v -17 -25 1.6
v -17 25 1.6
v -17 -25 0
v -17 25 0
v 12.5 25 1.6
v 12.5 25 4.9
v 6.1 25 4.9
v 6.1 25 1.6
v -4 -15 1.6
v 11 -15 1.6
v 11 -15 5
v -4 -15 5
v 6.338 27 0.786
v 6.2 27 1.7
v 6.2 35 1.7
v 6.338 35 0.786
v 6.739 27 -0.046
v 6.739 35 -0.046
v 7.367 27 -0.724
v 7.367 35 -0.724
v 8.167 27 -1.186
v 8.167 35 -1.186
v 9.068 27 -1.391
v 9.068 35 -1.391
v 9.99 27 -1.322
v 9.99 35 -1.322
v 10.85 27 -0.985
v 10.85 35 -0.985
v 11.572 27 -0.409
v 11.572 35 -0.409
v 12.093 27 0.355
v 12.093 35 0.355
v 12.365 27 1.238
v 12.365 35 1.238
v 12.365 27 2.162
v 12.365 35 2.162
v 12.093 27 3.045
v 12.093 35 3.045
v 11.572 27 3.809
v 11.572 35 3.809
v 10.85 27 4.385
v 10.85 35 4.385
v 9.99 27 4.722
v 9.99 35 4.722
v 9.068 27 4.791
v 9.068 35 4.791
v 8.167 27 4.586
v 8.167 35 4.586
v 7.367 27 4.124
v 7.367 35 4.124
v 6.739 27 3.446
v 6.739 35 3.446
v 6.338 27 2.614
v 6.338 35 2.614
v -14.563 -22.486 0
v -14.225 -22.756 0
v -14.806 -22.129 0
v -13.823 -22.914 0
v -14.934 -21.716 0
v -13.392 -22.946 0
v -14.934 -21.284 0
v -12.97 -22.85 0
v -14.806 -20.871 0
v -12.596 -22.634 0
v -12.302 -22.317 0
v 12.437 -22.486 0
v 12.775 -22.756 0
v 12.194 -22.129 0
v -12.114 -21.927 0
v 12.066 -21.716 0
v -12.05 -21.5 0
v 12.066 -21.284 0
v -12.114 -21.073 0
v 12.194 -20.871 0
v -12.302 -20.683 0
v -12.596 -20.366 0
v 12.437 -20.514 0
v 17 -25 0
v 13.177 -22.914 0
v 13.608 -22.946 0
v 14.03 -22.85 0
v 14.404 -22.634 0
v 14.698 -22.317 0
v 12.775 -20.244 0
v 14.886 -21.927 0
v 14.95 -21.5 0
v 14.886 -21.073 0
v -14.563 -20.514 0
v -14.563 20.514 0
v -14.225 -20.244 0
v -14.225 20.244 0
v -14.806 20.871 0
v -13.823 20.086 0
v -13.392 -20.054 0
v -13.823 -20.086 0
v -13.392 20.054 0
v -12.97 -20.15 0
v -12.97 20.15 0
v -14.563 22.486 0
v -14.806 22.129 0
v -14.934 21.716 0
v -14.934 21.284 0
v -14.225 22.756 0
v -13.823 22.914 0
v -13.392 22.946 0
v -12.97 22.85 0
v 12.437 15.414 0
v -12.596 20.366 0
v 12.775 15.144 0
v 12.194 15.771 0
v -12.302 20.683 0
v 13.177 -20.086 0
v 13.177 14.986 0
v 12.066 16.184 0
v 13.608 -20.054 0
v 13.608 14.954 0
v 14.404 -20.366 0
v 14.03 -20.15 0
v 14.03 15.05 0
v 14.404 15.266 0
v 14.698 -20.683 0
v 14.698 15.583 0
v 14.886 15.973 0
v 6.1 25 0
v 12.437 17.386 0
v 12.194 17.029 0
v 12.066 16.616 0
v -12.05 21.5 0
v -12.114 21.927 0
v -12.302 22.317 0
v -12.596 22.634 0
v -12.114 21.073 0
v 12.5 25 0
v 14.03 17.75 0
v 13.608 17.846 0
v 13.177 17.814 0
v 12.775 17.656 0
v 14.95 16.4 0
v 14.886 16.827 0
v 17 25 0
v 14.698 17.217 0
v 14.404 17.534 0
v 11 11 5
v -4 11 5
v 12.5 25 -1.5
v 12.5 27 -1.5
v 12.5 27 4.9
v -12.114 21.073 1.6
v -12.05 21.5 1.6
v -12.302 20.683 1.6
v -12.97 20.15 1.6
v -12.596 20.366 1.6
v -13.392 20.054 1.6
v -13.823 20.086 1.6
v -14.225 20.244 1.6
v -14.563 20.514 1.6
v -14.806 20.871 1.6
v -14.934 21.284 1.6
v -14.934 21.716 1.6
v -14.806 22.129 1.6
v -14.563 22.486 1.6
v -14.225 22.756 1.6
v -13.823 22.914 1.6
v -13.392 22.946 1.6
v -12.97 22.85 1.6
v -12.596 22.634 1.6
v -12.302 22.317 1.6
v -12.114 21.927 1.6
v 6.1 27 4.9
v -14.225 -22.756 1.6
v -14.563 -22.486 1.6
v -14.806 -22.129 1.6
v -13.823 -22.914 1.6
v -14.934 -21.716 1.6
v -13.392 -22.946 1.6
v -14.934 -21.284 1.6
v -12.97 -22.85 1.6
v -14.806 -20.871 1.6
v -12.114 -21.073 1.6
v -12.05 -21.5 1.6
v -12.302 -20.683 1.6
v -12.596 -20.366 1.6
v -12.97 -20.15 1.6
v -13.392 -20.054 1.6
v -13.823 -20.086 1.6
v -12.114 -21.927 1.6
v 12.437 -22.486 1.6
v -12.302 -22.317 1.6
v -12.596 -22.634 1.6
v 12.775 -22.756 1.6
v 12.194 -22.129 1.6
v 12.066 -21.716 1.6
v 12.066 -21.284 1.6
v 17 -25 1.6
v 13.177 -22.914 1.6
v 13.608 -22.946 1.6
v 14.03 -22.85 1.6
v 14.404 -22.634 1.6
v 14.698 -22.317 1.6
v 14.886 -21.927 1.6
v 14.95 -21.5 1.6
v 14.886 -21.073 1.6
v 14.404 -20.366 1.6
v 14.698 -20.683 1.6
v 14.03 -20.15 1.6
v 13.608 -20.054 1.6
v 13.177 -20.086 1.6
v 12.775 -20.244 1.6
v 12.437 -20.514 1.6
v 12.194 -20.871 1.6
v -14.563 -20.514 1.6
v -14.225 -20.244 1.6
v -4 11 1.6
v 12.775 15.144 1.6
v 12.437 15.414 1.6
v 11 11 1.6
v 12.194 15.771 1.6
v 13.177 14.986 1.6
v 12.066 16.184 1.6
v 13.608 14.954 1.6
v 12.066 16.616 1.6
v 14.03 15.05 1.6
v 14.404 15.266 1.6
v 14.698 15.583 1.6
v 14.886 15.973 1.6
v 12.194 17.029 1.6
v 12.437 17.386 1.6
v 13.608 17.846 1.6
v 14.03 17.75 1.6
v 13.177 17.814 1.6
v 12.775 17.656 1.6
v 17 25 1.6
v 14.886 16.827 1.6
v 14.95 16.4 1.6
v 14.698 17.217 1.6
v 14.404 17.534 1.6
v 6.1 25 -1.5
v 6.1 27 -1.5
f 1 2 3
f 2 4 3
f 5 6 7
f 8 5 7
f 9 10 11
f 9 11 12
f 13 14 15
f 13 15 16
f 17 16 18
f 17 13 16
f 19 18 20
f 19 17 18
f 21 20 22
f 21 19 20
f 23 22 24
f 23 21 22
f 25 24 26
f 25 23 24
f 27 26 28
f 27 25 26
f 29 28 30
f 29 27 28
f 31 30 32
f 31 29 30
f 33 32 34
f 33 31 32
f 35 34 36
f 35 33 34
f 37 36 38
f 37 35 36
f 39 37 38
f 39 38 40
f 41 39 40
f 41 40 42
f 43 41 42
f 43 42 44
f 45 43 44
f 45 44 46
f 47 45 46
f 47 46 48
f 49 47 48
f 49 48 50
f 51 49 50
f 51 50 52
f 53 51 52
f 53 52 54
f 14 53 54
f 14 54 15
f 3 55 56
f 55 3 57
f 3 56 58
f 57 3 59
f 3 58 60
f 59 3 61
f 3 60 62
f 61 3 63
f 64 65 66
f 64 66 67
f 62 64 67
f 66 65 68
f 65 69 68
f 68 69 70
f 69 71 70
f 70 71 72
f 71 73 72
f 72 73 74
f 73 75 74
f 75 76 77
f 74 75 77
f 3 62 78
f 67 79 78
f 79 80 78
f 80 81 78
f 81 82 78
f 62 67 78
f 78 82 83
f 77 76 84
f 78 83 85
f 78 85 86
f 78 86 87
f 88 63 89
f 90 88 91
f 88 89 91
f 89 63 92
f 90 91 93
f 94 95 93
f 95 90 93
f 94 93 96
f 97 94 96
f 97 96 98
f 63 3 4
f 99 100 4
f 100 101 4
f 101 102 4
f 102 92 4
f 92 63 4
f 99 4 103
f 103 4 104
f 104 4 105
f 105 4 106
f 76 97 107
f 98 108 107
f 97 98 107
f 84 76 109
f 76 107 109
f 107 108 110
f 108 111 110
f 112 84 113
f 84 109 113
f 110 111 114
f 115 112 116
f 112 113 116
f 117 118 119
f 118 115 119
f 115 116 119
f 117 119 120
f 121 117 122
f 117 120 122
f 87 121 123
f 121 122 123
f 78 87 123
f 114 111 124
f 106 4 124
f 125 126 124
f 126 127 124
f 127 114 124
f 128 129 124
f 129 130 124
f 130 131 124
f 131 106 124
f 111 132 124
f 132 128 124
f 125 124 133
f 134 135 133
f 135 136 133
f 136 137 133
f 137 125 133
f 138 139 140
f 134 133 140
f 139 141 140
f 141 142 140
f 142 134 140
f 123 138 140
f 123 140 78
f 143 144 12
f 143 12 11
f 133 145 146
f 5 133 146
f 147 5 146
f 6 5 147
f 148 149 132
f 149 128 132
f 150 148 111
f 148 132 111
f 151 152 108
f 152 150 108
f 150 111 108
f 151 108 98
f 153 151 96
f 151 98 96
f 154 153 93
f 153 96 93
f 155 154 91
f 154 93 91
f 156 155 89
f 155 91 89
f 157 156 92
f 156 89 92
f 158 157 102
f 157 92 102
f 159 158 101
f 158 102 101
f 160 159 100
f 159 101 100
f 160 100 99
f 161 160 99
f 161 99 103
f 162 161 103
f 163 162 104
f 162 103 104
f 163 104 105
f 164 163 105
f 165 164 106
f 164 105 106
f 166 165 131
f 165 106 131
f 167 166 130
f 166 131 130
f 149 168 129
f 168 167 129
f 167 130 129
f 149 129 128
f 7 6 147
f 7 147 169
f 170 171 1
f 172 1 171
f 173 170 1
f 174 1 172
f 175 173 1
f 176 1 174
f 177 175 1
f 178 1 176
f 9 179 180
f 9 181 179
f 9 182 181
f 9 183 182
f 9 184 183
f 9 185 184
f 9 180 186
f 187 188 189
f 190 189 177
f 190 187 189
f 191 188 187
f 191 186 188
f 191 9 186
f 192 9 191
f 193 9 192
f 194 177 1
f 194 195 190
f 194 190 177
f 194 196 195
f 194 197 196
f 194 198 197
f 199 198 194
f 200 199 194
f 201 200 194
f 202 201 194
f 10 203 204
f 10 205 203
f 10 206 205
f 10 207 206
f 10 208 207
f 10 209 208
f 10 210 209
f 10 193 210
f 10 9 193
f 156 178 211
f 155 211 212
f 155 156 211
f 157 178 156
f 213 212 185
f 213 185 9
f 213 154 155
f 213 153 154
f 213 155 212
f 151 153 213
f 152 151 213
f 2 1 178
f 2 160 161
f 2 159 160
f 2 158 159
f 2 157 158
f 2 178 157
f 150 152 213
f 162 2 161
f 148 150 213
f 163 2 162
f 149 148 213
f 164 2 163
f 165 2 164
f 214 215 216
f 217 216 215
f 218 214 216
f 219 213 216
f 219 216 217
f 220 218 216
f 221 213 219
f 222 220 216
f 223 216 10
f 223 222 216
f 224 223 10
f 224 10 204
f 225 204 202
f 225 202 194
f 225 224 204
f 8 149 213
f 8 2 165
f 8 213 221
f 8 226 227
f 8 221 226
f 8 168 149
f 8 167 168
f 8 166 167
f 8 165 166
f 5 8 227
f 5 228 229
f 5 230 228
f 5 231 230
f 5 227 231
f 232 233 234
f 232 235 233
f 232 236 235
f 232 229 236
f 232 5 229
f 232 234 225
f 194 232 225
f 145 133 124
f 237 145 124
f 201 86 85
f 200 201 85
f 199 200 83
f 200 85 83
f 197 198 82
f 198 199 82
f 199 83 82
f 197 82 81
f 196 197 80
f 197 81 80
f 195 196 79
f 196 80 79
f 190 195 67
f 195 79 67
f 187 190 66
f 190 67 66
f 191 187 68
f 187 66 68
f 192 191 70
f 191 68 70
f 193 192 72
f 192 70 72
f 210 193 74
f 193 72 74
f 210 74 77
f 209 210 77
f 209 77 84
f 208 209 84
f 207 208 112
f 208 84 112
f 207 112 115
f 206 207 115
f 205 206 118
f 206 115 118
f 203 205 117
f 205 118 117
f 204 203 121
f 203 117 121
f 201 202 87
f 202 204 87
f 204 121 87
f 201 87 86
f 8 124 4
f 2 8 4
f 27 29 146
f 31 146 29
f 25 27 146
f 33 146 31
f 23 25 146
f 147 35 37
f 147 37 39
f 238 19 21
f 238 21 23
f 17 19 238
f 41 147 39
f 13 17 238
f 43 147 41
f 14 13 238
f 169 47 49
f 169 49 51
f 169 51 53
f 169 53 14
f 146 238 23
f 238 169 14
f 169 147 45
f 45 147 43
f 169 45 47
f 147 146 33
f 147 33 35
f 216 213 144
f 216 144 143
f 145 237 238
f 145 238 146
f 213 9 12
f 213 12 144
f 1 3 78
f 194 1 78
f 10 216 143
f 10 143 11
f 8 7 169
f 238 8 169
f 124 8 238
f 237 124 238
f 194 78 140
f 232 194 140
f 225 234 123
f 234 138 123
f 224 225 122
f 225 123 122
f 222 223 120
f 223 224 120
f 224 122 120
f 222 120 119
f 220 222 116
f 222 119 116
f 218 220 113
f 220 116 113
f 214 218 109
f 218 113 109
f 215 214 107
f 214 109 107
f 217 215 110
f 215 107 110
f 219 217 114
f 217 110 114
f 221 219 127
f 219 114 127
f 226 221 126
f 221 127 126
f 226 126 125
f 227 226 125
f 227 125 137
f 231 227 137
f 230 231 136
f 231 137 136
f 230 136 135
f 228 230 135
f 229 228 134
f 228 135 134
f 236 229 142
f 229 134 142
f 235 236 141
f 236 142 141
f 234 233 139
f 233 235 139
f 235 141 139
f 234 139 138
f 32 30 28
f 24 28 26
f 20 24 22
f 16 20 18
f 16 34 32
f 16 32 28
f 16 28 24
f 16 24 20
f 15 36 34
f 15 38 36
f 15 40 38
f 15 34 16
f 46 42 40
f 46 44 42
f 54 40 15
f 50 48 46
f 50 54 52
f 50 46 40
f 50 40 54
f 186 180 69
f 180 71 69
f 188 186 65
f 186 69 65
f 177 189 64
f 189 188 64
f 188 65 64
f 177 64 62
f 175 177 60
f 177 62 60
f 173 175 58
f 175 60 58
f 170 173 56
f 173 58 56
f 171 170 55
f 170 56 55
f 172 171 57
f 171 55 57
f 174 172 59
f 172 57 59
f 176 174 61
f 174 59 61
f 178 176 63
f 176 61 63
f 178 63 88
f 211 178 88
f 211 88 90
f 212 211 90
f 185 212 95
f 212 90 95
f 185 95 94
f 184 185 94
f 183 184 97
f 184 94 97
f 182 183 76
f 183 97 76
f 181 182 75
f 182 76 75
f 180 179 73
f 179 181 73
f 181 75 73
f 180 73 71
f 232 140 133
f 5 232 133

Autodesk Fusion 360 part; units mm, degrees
sketch "Sketch1" plane through (0, 0, 0) normal (0, 0, 1) x (1, 0, 0)
  line L0 (17, 25) -> (-17, 25)
  line L1 (-17, 25) -> (-17, -25)
  line L2 (-17, -25) -> (17, -25)
  line L3 (17, -25) -> (17, 25)
  line L4 (17, 25) -> (-17, -25) construction
  line L5 (-17, 25) -> (17, -25) construction
  circle A0 centre (-13.5, 21.5) radius 1.45
  line L6 (-20, 0) -> (19, 0) construction
  circle A1 centre (-13.5, -21.5) radius 1.45
  line L7 (0, -29) -> (0, 26) construction
  circle A2 centre (13.5, -21.5) radius 1.45
  circle A3 centre (13.5, 16.4) radius 1.45
  line L8 (-4, 11) -> (11, 11)
  line L9 (11, 11) -> (11, -15)
  line L10 (11, -15) -> (-4, -15)
  line L11 (-4, -15) -> (-4, 11)
  dimension "d1" = 34
  dimension "d2" = 50
  dimension "d3" = 2.9
  dimension "d4" = 3.5
  dimension "d5" = 3.5
  dimension "d6" = 2.9
  dimension "d7" = 3.5
  dimension "d8" = 8.6
extrude "Extrude1" add sketch "Sketch1" along normal blind 1.6 contours L0 L1 L2 L3 | L8 L9 L10 L11
extrude "Extrude2" add sketch "Sketch1" along normal blind 5 contours L8 L9 L10 L11
sketch "Sketch2" plane through (0, 25, 0) normal (0, 1, 0) x (-1, 0, 0)
  line L0 (-17, 0) -> (17, 0)
  line L1 (17, 0) -> (17, 1.6)
  line L2 (17, 1.6) -> (-17, 1.6)
  line L3 (-17, 1.6) -> (-17, 0)
  line L4 (-6.1, -1.5) -> (-12.5, -1.5)
  line L5 (-12.5, -1.5) -> (-12.5, 4.9)
  line L6 (-12.5, 4.9) -> (-6.1, 4.9)
  line L7 (-6.1, 4.9) -> (-6.1, -1.5)
  line L8 (-17, 0) -> (17, 0)
  line L9 (-6.1, -1.5) -> (-12.5, 4.9) construction
  line L10 (-12.5, -1.5) -> (-6.1, 4.9) construction
  circle A0 centre (-9.3, 1.7) radius 3.1
  dimension "d13" = 6.4
  dimension "d14" = 6.4
  dimension "d15" = 4.5
  dimension "d16" = 1.5
  dimension "d17" = 6.2
extrude "Extrude3" add sketch "Sketch2" along normal blind 2 contours L0 L2 L5 L8 A0 | L0 L4 L5 L7 L8 A0 | L0 L2 L8 A0 | L0 L8 A0 | L2 L5 L6 L7 A0 | L0 L2 L7 L8 A0 | L2 A0
extrude "Extrude4" add sketch "Sketch2" along normal blind 10 contours L0 L2 L8 A0 | L0 L8 A0 | L2 A0
equation "d4 = 2 mm + 1.5 mm"
equation "d8 = 7.1 mm + 1.5 mm"
